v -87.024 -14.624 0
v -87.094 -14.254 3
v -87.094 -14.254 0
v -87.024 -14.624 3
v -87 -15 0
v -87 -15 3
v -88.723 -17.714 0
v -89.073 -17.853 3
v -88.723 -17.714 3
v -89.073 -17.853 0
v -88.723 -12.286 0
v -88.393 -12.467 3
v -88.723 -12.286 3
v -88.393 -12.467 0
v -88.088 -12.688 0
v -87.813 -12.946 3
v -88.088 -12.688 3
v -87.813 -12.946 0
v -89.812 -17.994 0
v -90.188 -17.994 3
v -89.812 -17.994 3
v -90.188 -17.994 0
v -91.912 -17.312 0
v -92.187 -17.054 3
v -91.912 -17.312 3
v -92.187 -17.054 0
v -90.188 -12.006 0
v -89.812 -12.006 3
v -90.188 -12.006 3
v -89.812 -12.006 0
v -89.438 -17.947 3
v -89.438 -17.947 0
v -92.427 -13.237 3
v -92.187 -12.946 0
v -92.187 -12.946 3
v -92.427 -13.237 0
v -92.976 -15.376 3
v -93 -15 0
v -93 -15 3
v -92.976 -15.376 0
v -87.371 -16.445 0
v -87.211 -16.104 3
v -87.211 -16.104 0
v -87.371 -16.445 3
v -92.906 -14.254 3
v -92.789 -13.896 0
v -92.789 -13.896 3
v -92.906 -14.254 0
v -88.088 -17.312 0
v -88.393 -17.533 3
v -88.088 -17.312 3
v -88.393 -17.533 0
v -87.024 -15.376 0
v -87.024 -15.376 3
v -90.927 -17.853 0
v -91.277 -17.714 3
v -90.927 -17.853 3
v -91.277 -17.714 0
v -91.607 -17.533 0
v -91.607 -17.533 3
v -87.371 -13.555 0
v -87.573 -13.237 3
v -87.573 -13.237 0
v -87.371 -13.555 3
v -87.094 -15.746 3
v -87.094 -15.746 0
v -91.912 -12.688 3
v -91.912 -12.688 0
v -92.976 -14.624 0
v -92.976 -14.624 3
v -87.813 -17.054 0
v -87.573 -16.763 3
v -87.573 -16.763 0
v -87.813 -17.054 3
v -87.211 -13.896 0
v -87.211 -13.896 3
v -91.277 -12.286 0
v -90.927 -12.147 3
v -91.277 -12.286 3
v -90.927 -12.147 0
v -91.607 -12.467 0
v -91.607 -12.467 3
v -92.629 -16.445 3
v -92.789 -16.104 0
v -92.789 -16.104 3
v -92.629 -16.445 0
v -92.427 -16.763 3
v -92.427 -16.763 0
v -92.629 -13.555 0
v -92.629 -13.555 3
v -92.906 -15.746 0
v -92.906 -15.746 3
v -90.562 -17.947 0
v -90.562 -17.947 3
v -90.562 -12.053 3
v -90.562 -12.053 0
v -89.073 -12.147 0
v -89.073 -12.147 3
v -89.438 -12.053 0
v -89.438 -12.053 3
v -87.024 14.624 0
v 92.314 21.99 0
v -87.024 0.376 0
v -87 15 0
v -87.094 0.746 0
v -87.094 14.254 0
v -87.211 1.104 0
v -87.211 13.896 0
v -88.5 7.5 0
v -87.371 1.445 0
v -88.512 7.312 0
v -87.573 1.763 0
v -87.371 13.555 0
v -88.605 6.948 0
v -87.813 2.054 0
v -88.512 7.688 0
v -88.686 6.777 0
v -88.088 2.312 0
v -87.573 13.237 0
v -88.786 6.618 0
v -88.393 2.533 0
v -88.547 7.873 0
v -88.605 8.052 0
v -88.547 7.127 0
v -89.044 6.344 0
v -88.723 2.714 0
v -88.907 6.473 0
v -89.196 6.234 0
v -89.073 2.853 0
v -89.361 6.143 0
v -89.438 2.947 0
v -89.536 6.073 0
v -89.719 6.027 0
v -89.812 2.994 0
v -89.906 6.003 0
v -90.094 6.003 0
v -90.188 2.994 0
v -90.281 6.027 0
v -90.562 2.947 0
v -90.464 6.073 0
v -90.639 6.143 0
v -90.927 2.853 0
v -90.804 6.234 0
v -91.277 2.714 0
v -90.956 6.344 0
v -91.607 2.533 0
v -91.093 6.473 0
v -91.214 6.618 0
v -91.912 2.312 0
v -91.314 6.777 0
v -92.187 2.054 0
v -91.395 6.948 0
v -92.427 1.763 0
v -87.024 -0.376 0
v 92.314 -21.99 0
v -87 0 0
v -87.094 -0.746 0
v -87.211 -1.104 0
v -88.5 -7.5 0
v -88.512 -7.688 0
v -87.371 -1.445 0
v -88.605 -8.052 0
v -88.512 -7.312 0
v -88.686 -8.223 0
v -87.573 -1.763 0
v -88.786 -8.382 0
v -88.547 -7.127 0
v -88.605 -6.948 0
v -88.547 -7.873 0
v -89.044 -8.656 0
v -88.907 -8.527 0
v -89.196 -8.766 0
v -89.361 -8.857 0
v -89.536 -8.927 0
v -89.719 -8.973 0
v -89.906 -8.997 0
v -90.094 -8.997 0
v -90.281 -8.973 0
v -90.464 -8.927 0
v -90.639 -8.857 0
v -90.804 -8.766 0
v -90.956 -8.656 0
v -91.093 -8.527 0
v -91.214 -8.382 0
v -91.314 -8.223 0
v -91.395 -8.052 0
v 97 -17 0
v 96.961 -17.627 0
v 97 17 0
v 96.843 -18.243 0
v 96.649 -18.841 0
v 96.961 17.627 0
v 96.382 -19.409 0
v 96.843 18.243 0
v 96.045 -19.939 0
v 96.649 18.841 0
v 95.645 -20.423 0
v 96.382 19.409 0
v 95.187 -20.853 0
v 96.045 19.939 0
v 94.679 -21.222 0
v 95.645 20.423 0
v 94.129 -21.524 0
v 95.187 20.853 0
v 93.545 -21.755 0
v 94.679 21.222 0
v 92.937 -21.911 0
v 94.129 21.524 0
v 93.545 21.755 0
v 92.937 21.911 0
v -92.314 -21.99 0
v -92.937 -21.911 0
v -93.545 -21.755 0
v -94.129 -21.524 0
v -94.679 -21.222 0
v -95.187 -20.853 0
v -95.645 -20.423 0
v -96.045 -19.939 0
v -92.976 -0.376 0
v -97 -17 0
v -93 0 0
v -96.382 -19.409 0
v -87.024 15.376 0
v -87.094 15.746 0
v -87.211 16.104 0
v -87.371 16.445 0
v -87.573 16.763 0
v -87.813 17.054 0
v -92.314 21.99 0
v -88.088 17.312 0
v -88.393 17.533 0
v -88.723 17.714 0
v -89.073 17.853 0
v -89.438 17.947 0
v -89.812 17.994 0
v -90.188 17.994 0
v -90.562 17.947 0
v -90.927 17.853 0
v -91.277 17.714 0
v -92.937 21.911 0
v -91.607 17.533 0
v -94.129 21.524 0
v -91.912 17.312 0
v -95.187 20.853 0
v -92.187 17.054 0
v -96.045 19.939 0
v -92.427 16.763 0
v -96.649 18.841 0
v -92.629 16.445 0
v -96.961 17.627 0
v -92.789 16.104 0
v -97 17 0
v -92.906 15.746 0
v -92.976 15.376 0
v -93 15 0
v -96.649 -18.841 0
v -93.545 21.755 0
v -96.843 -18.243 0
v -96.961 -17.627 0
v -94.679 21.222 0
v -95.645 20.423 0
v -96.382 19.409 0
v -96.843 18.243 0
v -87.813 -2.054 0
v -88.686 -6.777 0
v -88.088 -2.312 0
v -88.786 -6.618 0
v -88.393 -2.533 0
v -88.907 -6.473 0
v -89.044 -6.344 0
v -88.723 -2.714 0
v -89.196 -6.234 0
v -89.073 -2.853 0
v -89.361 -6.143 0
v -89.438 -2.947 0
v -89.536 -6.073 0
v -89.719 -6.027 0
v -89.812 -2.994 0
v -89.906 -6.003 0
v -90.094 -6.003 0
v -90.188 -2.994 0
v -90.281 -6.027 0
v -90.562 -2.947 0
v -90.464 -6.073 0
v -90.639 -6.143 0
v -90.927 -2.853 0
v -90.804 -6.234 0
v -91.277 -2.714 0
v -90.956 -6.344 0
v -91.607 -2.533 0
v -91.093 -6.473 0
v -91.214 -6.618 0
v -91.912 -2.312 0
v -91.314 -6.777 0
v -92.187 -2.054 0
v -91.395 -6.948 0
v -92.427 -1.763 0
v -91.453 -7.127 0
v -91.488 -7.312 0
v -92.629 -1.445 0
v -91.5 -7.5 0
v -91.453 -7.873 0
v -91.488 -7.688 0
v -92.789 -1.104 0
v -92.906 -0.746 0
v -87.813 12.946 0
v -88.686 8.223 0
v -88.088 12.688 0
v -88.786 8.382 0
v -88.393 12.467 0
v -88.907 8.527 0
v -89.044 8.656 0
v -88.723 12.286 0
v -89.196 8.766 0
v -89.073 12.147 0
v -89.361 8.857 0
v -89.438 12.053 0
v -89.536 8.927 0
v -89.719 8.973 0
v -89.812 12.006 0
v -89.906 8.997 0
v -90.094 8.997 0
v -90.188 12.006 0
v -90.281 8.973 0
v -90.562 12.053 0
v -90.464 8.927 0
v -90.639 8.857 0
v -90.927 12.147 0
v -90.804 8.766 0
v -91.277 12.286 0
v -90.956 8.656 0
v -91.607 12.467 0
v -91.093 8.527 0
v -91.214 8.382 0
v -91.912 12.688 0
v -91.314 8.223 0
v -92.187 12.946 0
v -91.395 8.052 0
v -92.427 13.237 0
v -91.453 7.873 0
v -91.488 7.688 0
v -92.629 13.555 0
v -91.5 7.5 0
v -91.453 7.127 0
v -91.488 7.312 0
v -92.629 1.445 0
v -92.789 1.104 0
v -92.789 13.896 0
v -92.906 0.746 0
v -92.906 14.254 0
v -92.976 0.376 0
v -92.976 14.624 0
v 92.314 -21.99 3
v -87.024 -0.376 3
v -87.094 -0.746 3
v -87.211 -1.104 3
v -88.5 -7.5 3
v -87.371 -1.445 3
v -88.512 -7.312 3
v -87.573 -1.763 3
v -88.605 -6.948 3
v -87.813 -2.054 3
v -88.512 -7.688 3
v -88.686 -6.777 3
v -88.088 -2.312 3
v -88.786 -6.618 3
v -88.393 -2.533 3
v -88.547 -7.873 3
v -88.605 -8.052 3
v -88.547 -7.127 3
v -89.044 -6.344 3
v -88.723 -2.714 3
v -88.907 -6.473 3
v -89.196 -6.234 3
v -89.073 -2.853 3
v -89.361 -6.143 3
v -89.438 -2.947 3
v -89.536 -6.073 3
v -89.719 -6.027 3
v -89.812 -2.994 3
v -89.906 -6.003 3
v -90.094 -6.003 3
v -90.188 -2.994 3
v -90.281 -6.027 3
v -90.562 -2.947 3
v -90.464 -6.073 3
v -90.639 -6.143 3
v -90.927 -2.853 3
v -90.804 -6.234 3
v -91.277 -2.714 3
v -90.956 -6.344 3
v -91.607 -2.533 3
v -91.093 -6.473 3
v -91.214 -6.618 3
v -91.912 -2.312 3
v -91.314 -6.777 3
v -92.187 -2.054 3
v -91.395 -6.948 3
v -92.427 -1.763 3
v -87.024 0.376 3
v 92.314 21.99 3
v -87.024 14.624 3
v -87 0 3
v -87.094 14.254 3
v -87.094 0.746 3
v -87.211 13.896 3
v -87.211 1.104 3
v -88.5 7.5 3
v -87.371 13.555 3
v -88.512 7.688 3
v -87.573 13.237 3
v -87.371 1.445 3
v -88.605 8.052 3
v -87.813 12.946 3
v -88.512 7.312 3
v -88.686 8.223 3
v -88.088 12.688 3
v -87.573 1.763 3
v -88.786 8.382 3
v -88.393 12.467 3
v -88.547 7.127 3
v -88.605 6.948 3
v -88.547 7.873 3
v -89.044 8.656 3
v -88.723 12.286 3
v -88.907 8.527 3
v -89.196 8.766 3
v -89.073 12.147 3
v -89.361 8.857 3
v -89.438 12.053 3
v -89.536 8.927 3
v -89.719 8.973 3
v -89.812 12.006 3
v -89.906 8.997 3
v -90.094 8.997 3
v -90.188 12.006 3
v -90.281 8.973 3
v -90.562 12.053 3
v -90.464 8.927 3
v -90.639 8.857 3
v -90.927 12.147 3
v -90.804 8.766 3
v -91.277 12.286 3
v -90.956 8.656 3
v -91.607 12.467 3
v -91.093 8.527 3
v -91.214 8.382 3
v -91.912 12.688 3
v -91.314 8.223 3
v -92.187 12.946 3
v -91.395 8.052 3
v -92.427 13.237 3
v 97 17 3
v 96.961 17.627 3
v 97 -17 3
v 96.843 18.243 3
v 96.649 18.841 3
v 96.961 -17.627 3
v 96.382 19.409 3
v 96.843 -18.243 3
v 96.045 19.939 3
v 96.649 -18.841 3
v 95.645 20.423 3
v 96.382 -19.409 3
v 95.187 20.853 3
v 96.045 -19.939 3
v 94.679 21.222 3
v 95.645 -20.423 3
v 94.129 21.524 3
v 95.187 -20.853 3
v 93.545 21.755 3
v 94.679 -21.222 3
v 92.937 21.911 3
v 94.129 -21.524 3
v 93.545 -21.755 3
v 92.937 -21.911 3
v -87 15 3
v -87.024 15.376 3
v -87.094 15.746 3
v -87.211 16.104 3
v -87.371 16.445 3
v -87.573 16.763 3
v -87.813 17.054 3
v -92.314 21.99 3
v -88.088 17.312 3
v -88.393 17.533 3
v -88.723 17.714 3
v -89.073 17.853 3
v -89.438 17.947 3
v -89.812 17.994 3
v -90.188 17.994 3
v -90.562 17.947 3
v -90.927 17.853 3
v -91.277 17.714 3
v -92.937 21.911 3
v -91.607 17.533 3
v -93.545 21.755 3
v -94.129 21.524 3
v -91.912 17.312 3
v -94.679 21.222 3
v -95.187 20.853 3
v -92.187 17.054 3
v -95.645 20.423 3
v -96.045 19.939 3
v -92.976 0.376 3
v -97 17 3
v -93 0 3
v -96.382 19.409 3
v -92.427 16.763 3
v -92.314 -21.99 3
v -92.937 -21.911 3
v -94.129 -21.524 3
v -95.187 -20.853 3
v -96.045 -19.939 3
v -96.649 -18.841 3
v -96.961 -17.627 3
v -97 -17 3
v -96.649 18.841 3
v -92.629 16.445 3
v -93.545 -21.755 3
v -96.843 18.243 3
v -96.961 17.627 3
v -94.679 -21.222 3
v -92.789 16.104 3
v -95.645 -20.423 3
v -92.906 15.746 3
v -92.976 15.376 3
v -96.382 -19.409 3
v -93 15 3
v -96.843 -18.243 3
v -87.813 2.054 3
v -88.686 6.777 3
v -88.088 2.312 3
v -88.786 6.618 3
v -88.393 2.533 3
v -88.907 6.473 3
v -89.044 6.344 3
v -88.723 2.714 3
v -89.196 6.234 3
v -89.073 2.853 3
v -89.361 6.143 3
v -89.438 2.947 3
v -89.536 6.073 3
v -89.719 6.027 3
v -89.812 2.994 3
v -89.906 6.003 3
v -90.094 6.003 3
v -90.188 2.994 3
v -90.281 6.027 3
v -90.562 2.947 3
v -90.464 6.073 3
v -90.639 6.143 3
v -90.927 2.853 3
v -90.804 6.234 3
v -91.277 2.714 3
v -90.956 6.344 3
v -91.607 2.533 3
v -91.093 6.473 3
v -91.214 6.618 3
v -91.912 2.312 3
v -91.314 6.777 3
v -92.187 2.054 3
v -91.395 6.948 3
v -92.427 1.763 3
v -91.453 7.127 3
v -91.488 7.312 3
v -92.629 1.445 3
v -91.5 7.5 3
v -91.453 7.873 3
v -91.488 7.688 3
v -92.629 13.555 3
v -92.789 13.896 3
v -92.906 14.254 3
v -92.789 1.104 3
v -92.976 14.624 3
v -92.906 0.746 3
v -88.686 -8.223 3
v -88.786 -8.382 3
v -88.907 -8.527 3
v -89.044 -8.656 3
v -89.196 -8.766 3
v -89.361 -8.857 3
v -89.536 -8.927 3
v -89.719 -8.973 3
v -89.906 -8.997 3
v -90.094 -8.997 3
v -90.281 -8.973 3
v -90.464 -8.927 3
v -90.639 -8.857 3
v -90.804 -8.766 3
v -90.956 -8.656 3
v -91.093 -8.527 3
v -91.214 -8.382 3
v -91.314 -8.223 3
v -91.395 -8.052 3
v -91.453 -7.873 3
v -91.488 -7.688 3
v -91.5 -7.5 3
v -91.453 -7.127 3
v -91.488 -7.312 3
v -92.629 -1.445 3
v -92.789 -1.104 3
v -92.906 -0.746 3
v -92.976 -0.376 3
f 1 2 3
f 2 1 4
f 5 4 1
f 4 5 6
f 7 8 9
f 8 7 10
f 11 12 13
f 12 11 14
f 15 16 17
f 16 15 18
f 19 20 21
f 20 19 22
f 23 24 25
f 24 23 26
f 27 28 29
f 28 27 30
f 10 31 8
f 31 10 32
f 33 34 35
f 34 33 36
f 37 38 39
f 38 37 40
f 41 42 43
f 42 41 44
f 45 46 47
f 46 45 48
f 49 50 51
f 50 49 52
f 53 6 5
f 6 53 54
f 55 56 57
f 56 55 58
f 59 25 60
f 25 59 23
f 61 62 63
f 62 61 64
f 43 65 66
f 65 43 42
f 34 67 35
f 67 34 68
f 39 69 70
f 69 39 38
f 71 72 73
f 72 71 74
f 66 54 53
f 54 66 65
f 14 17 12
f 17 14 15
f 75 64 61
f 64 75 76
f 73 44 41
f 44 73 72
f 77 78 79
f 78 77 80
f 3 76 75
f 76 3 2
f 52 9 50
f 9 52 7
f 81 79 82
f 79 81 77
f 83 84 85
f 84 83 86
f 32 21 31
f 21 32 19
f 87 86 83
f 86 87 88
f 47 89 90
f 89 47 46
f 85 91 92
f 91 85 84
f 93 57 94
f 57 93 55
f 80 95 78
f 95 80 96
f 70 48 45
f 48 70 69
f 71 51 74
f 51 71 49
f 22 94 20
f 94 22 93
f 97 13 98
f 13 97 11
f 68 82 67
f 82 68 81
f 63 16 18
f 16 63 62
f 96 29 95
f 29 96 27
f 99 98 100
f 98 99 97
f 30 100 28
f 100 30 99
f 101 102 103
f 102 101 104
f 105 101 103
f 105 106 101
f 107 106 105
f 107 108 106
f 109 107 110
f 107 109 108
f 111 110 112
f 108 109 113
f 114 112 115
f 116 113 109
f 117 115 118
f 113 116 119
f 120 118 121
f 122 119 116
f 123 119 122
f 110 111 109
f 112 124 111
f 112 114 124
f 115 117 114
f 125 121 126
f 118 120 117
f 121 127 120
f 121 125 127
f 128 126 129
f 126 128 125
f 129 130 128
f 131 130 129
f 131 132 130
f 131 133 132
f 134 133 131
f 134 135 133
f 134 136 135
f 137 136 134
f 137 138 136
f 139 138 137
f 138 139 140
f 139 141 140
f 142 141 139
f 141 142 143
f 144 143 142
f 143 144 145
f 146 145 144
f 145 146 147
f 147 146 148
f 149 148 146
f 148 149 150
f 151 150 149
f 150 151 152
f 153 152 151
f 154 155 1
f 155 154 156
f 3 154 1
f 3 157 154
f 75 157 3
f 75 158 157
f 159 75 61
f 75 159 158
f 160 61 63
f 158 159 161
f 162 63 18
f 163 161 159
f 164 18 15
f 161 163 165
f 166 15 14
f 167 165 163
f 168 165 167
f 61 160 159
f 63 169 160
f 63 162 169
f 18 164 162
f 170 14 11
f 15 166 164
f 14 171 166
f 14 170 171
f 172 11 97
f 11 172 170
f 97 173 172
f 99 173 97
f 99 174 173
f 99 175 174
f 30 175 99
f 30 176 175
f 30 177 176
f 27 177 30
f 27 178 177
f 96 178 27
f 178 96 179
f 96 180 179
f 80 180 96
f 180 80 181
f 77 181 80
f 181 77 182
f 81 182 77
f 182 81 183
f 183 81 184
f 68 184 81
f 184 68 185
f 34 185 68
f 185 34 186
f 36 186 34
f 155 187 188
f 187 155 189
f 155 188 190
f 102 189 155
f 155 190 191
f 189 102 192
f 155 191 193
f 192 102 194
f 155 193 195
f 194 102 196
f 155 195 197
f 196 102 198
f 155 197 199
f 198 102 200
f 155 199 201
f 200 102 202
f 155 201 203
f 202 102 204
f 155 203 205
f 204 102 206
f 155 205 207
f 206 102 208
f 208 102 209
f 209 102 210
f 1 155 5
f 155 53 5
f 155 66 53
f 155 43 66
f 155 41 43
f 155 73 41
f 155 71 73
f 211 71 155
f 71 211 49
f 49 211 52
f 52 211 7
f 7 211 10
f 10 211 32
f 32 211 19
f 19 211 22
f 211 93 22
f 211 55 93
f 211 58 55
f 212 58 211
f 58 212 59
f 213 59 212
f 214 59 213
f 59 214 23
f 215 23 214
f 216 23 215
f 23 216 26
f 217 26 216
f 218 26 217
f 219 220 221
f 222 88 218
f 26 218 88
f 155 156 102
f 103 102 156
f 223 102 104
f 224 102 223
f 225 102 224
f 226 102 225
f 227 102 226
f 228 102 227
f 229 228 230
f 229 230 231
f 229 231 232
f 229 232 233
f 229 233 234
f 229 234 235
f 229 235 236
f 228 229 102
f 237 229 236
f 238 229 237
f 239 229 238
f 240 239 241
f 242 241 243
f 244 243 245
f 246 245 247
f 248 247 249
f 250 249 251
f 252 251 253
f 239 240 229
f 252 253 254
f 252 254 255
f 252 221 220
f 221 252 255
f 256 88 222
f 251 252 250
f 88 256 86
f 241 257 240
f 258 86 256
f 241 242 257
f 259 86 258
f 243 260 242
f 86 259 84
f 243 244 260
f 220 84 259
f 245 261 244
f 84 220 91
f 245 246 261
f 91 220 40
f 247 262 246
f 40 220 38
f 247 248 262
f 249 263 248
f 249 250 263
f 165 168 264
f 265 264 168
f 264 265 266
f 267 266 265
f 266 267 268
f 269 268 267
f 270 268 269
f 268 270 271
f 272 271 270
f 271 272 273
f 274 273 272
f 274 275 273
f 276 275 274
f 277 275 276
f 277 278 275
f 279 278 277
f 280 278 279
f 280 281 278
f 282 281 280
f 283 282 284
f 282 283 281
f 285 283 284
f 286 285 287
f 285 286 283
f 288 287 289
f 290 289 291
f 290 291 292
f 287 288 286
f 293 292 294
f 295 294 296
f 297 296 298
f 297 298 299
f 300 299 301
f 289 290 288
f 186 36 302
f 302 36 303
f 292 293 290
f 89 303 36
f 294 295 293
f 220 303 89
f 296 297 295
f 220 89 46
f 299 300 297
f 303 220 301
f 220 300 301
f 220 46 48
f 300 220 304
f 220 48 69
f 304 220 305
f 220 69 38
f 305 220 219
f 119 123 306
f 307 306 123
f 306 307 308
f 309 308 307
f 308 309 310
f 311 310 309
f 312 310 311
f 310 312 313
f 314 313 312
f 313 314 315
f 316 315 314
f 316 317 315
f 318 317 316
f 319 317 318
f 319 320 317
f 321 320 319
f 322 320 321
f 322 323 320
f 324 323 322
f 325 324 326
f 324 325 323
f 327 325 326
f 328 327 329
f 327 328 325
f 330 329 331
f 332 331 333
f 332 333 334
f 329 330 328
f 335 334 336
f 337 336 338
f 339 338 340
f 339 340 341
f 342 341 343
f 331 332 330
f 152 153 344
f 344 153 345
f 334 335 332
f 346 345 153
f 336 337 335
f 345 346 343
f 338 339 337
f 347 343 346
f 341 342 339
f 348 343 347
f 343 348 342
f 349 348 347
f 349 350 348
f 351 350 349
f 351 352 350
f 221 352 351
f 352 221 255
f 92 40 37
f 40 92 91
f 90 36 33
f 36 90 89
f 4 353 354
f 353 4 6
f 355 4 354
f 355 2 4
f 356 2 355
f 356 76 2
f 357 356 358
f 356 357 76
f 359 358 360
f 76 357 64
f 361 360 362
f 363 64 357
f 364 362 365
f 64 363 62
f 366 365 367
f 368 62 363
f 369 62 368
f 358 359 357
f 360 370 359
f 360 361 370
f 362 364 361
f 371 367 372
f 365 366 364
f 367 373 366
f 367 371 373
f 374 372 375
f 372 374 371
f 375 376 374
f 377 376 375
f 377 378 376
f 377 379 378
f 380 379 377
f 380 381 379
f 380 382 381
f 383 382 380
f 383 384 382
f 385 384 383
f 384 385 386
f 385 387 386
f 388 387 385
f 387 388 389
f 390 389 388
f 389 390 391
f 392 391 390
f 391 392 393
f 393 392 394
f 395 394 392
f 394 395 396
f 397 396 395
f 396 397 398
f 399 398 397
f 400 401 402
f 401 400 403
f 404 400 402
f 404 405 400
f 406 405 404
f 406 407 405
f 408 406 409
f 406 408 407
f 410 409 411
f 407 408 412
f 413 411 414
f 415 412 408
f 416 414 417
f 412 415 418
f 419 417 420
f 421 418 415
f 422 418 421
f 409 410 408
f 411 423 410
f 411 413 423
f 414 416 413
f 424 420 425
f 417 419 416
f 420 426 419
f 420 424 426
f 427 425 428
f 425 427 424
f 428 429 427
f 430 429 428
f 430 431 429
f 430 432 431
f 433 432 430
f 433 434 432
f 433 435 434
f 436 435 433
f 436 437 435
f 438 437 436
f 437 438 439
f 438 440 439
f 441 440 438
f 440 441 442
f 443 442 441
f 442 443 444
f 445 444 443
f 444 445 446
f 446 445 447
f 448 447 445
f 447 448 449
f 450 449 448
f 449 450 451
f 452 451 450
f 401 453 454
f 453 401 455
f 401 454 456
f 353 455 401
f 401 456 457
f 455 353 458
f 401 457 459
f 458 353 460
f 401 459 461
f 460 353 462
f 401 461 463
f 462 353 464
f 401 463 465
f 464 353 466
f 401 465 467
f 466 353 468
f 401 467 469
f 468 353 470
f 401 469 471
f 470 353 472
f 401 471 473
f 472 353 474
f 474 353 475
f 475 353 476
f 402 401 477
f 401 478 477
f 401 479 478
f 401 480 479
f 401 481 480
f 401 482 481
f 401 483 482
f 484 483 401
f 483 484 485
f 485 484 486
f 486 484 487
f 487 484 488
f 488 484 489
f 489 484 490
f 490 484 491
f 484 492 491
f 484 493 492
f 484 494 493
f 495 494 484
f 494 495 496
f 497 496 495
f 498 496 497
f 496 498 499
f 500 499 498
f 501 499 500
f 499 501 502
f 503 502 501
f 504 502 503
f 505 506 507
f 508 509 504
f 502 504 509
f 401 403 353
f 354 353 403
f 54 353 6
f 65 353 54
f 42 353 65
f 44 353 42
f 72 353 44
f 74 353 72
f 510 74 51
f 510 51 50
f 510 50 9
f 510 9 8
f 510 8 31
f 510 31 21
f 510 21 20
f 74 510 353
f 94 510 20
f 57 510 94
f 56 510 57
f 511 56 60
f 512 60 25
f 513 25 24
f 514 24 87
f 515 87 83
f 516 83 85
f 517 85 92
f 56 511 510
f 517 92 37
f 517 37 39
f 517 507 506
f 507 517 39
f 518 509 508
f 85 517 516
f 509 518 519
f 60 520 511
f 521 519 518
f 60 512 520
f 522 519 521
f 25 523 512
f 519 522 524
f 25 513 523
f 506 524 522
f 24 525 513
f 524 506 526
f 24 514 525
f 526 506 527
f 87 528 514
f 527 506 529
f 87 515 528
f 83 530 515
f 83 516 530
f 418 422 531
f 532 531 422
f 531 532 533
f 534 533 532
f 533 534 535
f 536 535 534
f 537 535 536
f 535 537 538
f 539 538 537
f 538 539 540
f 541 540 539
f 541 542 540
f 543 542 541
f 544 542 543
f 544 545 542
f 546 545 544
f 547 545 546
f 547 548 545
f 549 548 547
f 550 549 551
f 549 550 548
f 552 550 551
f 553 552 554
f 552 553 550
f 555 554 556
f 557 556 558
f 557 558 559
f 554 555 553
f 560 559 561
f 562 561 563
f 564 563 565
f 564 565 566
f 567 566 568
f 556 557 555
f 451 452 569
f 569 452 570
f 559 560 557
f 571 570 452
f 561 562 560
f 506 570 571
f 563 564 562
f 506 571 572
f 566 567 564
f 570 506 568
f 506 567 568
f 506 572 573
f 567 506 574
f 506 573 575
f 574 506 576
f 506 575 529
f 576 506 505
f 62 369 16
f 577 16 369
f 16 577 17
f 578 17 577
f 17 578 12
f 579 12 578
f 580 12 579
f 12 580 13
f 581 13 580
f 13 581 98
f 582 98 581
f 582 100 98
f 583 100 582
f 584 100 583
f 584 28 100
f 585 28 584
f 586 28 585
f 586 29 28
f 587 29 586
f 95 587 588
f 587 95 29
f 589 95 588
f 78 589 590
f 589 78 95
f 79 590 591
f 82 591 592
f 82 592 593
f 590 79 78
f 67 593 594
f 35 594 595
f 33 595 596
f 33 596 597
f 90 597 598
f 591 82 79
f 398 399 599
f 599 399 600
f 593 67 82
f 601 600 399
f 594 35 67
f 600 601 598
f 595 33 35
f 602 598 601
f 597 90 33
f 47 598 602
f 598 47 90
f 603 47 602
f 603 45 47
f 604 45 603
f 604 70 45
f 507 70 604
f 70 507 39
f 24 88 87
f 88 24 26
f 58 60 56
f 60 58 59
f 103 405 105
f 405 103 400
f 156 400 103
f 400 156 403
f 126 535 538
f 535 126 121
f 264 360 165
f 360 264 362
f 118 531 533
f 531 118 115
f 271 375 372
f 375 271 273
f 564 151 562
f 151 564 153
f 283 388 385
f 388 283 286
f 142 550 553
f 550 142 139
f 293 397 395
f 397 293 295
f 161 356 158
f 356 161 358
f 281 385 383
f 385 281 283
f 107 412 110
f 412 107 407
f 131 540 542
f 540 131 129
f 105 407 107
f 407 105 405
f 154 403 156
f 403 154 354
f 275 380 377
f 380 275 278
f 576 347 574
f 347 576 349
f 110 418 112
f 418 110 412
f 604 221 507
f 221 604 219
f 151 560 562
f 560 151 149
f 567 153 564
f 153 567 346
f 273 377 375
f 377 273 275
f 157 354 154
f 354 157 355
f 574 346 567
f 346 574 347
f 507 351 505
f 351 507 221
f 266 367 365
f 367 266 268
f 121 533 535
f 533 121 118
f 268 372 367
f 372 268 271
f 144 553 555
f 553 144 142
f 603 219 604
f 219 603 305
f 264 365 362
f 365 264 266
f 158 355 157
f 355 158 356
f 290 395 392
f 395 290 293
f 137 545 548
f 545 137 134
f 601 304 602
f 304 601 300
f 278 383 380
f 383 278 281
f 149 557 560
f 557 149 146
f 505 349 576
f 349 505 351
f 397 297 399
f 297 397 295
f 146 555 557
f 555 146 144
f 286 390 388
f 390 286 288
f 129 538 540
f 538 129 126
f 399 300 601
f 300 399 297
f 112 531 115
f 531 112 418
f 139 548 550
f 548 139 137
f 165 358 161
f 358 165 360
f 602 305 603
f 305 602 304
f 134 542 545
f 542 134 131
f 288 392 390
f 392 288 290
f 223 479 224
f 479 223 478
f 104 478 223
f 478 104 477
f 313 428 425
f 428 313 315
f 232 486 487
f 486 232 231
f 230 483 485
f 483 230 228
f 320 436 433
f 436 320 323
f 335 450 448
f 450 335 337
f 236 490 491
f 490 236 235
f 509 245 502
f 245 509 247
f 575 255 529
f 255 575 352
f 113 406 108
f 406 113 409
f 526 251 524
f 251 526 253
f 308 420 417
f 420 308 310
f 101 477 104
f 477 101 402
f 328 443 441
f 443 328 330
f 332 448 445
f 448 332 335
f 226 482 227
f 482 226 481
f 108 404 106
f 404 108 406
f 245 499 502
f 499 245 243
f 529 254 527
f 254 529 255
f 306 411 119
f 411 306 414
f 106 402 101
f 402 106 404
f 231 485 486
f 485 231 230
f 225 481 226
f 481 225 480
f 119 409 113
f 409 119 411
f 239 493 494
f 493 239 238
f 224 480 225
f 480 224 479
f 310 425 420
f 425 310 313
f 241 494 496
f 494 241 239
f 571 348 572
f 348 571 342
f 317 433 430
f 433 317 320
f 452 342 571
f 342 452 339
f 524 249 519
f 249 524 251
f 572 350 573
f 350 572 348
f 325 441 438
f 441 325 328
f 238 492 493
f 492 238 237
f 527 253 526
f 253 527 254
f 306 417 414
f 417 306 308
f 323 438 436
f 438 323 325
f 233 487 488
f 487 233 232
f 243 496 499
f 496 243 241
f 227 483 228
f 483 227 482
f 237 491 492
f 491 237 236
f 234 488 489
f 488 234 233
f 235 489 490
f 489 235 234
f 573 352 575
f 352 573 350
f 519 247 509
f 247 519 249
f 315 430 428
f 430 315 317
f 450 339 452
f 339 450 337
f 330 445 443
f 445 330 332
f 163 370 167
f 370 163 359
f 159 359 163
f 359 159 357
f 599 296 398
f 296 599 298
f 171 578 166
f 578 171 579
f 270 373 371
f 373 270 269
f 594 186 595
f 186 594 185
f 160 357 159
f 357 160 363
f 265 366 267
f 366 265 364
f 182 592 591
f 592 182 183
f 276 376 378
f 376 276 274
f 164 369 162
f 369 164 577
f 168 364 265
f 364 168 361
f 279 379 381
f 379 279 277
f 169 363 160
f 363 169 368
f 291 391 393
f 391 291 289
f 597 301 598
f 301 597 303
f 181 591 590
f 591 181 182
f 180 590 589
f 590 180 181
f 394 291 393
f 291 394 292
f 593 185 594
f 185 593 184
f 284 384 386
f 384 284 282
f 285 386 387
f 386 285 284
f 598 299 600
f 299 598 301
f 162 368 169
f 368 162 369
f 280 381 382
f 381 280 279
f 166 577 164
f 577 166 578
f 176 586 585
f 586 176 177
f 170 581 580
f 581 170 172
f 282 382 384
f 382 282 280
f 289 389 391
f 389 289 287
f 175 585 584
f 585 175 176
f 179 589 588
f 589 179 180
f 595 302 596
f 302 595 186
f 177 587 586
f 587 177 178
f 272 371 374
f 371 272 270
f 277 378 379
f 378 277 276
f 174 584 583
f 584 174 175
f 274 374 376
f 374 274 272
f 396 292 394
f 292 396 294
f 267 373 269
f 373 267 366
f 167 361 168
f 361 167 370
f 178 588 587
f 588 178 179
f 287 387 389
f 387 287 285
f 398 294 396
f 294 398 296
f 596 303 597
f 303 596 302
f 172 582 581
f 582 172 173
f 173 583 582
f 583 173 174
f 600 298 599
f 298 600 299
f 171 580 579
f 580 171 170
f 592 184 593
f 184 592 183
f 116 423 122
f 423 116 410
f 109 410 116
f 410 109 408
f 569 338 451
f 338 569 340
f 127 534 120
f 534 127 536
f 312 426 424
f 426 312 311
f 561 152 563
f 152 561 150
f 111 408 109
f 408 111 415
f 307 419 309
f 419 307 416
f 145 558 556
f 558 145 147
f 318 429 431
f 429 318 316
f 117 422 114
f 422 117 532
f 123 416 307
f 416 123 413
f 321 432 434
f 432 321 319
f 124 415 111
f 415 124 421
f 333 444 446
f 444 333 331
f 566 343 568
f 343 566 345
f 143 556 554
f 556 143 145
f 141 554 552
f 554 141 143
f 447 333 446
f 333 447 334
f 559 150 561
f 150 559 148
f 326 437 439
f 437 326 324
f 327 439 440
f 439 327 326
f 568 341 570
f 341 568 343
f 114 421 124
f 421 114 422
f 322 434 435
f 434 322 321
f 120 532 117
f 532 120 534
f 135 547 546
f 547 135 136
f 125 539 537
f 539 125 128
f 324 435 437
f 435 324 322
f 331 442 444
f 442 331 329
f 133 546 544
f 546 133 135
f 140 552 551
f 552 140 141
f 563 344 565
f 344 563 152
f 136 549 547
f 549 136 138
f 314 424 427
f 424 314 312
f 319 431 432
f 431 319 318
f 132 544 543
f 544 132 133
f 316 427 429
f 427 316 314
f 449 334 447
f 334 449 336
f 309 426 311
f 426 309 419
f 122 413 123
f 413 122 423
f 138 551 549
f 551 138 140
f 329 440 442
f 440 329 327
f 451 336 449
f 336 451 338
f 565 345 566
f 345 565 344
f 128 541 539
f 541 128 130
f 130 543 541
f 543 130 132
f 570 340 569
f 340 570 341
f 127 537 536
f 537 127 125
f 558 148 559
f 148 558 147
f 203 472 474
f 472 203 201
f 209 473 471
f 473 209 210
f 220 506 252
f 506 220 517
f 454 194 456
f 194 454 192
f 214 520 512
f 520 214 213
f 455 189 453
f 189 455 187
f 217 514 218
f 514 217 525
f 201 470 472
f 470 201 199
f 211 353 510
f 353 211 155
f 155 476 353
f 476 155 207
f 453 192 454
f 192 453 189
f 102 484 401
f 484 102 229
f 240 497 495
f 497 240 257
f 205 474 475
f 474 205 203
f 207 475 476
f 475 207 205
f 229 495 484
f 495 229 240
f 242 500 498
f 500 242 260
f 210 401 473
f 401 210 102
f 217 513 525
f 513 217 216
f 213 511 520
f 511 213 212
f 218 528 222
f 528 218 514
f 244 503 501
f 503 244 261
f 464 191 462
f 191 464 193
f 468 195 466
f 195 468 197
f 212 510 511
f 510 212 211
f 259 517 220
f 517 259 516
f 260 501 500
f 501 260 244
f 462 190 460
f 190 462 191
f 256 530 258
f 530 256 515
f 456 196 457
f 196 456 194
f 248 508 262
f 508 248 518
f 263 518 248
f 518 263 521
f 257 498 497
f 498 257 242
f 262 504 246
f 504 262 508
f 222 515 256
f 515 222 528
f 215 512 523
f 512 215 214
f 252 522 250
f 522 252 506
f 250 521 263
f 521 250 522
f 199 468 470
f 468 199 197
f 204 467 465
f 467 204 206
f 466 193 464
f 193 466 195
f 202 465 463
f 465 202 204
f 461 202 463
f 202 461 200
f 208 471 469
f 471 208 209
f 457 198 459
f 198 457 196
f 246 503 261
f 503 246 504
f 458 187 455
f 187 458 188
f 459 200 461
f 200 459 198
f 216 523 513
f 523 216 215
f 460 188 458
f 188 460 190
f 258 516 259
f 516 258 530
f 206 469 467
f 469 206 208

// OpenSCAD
$fn = 50;


difference() {
	union() {
		hull() {
			translate(v = [-92.0000000000, 17.0000000000, 0]) {
				cylinder(h = 3, r = 5);
			}
			translate(v = [92.0000000000, 17.0000000000, 0]) {
				cylinder(h = 3, r = 5);
			}
			translate(v = [-92.0000000000, -17.0000000000, 0]) {
				cylinder(h = 3, r = 5);
			}
			translate(v = [92.0000000000, -17.0000000000, 0]) {
				cylinder(h = 3, r = 5);
			}
		}
	}
	union() {
		translate(v = [-90.0000000000, -15.0000000000, 0]) {
			cylinder(h = 3, r = 3.0000000000);
		}
		translate(v = [-90.0000000000, 0.0000000000, 0]) {
			cylinder(h = 3, r = 3.0000000000);
		}
		translate(v = [-90.0000000000, 15.0000000000, 0]) {
			cylinder(h = 3, r = 3.0000000000);
		}
		translate(v = [-90.0000000000, -15.0000000000, 0]) {
			cylinder(h = 3, r = 1.5000000000);
		}
		translate(v = [-90.0000000000, -7.5000000000, 0]) {
			cylinder(h = 3, r = 1.5000000000);
		}
		translate(v = [-90.0000000000, 0.0000000000, 0]) {
			cylinder(h = 3, r = 1.5000000000);
		}
		translate(v = [-90.0000000000, 7.5000000000, 0]) {
			cylinder(h = 3, r = 1.5000000000);
		}
		translate(v = [-90.0000000000, 15.0000000000, 0]) {
			cylinder(h = 3, r = 1.5000000000);
		}
		translate(v = [-90.0000000000, -15.0000000000, 0]) {
			cylinder(h = 3, r = 1.5000000000);
		}
		translate(v = [-90.0000000000, -7.5000000000, 0]) {
			cylinder(h = 3, r = 1.5000000000);
		}
		translate(v = [-90.0000000000, 0.0000000000, 0]) {
			cylinder(h = 3, r = 1.5000000000);
		}
		translate(v = [-90.0000000000, 7.5000000000, 0]) {
			cylinder(h = 3, r = 1.5000000000);
		}
		translate(v = [-90.0000000000, 15.0000000000, 0]) {
			cylinder(h = 3, r = 1.5000000000);
		}
		translate(v = [-90.0000000000, -15.0000000000, 0]) {
			cylinder(h = 3, r = 1.5000000000);
		}
		translate(v = [-90.0000000000, -7.5000000000, 0]) {
			cylinder(h = 3, r = 1.5000000000);
		}
		translate(v = [-90.0000000000, 0.0000000000, 0]) {
			cylinder(h = 3, r = 1.5000000000);
		}
		translate(v = [-90.0000000000, 7.5000000000, 0]) {
			cylinder(h = 3, r = 1.5000000000);
		}
		translate(v = [-90.0000000000, 15.0000000000, 0]) {
			cylinder(h = 3, r = 1.5000000000);
		}
	}
}
